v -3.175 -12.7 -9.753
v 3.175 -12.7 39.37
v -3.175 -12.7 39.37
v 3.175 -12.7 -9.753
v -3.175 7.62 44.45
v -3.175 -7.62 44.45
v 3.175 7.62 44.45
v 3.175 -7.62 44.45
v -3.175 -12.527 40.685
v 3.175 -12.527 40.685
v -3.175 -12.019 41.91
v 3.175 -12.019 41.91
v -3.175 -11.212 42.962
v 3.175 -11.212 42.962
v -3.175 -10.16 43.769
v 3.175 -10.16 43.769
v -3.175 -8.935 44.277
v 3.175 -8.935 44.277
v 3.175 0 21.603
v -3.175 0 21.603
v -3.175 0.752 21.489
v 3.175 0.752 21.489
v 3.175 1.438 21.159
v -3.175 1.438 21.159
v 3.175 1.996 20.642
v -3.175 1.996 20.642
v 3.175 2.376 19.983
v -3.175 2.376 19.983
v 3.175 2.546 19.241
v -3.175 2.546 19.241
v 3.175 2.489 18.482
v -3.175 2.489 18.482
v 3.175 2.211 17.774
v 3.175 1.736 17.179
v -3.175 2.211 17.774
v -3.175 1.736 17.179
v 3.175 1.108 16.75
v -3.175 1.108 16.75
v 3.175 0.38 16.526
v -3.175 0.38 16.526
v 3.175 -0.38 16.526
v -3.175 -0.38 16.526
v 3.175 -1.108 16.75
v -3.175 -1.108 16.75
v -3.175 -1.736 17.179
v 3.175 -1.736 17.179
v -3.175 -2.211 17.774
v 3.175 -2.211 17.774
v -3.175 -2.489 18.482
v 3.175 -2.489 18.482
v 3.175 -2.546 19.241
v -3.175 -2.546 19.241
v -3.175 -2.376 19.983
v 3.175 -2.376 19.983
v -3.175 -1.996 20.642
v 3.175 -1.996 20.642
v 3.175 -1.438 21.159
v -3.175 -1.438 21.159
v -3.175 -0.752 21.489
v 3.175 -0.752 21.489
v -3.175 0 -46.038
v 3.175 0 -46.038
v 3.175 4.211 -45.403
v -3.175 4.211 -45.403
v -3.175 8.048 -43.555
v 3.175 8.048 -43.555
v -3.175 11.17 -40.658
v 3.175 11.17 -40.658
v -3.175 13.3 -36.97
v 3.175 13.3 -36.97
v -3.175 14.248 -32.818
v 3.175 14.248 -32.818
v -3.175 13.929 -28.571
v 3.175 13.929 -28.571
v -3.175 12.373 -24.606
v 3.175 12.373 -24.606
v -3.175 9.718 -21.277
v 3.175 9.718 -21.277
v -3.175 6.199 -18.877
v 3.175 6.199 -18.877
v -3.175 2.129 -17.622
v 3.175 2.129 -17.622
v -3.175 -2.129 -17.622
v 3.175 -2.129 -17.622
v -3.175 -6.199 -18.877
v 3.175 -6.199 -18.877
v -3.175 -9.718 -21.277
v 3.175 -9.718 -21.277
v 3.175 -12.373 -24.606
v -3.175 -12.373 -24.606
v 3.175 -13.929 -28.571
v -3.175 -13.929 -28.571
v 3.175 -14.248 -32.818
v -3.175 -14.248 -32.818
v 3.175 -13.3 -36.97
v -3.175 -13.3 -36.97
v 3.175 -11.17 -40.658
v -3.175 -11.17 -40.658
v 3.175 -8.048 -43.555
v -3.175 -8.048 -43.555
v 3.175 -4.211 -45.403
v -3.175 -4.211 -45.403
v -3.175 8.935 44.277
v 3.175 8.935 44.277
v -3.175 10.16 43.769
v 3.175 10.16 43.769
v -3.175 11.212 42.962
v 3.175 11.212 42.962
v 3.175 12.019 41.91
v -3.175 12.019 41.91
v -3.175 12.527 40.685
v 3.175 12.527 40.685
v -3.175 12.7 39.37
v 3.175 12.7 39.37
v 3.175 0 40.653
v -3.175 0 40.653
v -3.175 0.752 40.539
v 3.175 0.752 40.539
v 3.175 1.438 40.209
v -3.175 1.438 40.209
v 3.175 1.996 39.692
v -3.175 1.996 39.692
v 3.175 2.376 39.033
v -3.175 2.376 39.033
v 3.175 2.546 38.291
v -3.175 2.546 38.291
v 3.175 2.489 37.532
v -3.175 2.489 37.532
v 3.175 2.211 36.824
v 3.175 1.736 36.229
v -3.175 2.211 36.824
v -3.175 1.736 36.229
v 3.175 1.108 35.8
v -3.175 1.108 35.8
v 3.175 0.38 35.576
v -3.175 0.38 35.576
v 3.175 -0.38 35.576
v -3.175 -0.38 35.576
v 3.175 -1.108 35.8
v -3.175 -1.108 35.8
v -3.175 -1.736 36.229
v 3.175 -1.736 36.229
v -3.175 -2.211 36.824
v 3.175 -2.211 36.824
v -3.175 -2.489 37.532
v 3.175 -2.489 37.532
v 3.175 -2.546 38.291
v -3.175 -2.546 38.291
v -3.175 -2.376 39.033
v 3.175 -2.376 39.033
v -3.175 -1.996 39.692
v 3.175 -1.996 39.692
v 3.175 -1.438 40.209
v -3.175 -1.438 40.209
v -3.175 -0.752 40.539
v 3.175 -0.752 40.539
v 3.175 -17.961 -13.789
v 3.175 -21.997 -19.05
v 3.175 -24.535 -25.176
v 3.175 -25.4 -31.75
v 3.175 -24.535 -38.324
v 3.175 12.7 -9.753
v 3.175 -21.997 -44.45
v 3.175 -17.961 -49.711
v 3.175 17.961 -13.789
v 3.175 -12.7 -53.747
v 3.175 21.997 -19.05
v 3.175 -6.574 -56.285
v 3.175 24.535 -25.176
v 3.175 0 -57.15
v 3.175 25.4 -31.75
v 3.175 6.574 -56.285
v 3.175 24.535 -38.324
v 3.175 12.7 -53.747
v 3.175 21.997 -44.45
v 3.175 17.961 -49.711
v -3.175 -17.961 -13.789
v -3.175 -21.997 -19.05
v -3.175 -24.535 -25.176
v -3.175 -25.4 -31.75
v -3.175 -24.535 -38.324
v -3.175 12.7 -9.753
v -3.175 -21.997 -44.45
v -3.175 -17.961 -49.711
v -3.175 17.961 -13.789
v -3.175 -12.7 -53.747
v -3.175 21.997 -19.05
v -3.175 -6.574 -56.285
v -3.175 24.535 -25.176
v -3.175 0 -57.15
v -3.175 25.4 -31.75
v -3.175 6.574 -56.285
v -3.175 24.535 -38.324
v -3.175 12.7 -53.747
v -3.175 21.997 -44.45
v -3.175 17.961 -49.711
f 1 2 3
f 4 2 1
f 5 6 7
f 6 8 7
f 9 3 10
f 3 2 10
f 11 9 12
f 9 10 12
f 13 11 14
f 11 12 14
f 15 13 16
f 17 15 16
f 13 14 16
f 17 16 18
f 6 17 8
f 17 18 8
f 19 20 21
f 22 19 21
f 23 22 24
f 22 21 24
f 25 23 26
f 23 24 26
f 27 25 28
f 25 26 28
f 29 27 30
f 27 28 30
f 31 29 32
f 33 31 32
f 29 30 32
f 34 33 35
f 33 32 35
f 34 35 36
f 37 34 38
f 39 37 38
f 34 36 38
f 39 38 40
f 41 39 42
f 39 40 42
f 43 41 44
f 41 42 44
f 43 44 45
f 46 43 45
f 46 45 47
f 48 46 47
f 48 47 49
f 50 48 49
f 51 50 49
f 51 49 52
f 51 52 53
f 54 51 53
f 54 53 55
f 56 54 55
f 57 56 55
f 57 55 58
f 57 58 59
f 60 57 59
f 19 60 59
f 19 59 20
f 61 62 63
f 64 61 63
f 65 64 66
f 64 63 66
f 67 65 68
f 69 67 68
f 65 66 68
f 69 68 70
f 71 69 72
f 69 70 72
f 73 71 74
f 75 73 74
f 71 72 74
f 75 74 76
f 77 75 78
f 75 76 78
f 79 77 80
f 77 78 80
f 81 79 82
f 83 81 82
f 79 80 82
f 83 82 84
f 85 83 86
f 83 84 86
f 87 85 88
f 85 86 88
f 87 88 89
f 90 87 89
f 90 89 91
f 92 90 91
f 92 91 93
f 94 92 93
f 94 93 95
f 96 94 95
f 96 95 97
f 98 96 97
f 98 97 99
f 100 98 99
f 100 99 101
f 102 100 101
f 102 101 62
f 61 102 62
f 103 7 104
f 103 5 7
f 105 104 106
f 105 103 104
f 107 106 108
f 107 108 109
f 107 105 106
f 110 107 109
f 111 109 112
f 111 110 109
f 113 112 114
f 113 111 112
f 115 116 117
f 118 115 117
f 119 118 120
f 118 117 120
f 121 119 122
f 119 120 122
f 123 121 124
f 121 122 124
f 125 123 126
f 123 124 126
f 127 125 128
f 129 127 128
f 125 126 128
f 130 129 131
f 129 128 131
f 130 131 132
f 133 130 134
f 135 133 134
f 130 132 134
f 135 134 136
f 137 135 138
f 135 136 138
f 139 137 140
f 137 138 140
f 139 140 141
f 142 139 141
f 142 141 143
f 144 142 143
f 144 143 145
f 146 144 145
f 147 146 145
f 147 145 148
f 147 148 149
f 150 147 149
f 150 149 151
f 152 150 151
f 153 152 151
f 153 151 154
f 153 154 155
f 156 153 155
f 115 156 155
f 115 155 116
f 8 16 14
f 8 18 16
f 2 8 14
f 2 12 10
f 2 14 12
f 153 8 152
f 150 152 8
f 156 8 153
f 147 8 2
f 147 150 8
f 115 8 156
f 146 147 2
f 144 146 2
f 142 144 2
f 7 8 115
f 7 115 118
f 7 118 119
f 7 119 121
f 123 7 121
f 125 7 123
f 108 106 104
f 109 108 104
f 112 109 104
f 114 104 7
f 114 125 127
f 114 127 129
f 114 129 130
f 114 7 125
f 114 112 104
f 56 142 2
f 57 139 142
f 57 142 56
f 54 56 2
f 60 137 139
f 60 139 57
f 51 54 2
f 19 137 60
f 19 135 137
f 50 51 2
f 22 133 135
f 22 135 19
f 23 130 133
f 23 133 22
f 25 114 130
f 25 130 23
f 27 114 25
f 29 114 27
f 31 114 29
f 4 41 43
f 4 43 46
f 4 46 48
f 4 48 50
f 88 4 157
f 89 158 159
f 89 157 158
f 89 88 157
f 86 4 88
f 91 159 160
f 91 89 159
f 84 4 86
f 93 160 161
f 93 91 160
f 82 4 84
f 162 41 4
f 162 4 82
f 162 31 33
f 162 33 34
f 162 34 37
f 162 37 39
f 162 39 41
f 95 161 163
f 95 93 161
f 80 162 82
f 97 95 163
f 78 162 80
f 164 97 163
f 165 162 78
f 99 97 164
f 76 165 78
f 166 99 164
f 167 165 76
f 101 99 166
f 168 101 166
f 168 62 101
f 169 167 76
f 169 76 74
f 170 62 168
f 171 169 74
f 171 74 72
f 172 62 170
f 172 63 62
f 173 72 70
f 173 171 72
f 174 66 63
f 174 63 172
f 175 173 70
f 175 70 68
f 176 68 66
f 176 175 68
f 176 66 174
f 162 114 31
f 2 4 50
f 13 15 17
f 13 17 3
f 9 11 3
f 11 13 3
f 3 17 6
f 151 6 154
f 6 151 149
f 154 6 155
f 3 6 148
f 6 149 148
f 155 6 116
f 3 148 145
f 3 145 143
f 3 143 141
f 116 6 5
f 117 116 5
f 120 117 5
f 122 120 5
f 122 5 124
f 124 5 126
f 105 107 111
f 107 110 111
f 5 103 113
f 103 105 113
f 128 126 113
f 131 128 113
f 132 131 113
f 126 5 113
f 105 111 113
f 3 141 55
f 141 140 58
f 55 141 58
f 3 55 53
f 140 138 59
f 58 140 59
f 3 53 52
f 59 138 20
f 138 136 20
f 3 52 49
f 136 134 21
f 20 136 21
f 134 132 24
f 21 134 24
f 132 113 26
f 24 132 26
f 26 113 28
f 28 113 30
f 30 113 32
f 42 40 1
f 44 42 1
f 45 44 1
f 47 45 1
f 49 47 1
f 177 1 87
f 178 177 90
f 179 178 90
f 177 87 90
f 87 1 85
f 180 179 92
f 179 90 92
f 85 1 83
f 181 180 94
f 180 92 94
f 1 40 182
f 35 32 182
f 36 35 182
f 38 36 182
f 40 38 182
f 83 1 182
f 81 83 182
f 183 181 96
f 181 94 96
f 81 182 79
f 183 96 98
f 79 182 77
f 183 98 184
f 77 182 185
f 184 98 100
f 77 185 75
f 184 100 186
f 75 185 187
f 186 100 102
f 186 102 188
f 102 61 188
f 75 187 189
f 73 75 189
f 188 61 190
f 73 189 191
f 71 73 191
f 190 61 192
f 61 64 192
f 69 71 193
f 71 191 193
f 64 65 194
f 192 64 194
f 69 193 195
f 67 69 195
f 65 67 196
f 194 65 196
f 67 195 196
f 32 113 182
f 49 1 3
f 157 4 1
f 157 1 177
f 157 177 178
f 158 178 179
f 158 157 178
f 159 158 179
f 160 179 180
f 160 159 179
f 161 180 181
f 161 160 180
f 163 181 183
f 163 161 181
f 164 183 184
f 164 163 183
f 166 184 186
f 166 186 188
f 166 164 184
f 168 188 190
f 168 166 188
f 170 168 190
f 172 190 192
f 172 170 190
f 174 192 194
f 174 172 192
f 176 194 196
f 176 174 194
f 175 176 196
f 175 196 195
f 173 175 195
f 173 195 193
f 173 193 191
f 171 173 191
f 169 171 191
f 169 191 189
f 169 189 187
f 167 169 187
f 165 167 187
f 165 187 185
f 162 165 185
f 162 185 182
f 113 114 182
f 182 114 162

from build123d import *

# Parameters (mm, degrees)
SKETCH1_W              = 88.9
SKETCH1_H              = 25.4
BOSS_EXTRUDE1_DEPTH    = 3.175
FILLET1_R              = 12.7
F_10_CLEARANCE_HOLE1_D = 5.1054
FILLET2_R              = 5.08
SKETCH6_R              = 25.4
BOSS_EXTRUDE2_DEPTH    = 6.35
SKETCH7_R              = 14.2875
CUT_EXTRUDE1_DEPTH     = 63.861792847


with BuildPart() as part:
    # Sketch1 → Boss-Extrude1 (new, symmetric)
    with BuildSketch(Plane(origin=(0, 0, 0), x_dir=(0, 0, -1), z_dir=(1, 0, 0))):
        Rectangle(SKETCH1_W, SKETCH1_H)
    extrude(amount=BOSS_EXTRUDE1_DEPTH, both=True)

    # Fillet1
    fillet1_edges = [part.edges().sort_by_distance(p)[0] for p in [
        (0, -12.7, -44.45),
        (0, 12.7, -44.45),
    ]]
    fillet(fillet1_edges, radius=FILLET1_R - 0.0001)  # a hair under: the kernel refuses the full size

    # #10 Clearance Hole1 (through all)
    with Locations(Plane(origin=(3.175, 6.272913445, 168.827028559), x_dir=(0, 0, -1), z_dir=(1, 0, 0))):
        with Locations((149.777028559, -6.272913445), (130.727028559, -6.272913445)):
            Hole(F_10_CLEARANCE_HOLE1_D / 2)

    # Fillet2
    fillet2_edges = [part.edges().sort_by_distance(p)[0] for p in [
        (0, -12.7, 44.45),
        (0, 12.7, 44.45),
    ]]
    fillet(fillet2_edges, radius=FILLET2_R)

    # Sketch6 → Boss-Extrude2 (add)
    with BuildSketch(Plane(origin=(3.175, 0, 0), x_dir=(0, 0, -1), z_dir=(1, 0, 0))):
        with Locations((31.75, 0)):
            Circle(SKETCH6_R)
    extrude(amount=-BOSS_EXTRUDE2_DEPTH)

    # Sketch7 → Cut-Extrude1 (cut, through all)
    with BuildSketch(Plane(origin=(3.175, 0, 0), x_dir=(0, 0, -1), z_dir=(1, 0, 0))):
        with Locations((31.75, 0)):
            Circle(SKETCH7_R)
    extrude(amount=-CUT_EXTRUDE1_DEPTH, mode=Mode.SUBTRACT)


solid = part.part
